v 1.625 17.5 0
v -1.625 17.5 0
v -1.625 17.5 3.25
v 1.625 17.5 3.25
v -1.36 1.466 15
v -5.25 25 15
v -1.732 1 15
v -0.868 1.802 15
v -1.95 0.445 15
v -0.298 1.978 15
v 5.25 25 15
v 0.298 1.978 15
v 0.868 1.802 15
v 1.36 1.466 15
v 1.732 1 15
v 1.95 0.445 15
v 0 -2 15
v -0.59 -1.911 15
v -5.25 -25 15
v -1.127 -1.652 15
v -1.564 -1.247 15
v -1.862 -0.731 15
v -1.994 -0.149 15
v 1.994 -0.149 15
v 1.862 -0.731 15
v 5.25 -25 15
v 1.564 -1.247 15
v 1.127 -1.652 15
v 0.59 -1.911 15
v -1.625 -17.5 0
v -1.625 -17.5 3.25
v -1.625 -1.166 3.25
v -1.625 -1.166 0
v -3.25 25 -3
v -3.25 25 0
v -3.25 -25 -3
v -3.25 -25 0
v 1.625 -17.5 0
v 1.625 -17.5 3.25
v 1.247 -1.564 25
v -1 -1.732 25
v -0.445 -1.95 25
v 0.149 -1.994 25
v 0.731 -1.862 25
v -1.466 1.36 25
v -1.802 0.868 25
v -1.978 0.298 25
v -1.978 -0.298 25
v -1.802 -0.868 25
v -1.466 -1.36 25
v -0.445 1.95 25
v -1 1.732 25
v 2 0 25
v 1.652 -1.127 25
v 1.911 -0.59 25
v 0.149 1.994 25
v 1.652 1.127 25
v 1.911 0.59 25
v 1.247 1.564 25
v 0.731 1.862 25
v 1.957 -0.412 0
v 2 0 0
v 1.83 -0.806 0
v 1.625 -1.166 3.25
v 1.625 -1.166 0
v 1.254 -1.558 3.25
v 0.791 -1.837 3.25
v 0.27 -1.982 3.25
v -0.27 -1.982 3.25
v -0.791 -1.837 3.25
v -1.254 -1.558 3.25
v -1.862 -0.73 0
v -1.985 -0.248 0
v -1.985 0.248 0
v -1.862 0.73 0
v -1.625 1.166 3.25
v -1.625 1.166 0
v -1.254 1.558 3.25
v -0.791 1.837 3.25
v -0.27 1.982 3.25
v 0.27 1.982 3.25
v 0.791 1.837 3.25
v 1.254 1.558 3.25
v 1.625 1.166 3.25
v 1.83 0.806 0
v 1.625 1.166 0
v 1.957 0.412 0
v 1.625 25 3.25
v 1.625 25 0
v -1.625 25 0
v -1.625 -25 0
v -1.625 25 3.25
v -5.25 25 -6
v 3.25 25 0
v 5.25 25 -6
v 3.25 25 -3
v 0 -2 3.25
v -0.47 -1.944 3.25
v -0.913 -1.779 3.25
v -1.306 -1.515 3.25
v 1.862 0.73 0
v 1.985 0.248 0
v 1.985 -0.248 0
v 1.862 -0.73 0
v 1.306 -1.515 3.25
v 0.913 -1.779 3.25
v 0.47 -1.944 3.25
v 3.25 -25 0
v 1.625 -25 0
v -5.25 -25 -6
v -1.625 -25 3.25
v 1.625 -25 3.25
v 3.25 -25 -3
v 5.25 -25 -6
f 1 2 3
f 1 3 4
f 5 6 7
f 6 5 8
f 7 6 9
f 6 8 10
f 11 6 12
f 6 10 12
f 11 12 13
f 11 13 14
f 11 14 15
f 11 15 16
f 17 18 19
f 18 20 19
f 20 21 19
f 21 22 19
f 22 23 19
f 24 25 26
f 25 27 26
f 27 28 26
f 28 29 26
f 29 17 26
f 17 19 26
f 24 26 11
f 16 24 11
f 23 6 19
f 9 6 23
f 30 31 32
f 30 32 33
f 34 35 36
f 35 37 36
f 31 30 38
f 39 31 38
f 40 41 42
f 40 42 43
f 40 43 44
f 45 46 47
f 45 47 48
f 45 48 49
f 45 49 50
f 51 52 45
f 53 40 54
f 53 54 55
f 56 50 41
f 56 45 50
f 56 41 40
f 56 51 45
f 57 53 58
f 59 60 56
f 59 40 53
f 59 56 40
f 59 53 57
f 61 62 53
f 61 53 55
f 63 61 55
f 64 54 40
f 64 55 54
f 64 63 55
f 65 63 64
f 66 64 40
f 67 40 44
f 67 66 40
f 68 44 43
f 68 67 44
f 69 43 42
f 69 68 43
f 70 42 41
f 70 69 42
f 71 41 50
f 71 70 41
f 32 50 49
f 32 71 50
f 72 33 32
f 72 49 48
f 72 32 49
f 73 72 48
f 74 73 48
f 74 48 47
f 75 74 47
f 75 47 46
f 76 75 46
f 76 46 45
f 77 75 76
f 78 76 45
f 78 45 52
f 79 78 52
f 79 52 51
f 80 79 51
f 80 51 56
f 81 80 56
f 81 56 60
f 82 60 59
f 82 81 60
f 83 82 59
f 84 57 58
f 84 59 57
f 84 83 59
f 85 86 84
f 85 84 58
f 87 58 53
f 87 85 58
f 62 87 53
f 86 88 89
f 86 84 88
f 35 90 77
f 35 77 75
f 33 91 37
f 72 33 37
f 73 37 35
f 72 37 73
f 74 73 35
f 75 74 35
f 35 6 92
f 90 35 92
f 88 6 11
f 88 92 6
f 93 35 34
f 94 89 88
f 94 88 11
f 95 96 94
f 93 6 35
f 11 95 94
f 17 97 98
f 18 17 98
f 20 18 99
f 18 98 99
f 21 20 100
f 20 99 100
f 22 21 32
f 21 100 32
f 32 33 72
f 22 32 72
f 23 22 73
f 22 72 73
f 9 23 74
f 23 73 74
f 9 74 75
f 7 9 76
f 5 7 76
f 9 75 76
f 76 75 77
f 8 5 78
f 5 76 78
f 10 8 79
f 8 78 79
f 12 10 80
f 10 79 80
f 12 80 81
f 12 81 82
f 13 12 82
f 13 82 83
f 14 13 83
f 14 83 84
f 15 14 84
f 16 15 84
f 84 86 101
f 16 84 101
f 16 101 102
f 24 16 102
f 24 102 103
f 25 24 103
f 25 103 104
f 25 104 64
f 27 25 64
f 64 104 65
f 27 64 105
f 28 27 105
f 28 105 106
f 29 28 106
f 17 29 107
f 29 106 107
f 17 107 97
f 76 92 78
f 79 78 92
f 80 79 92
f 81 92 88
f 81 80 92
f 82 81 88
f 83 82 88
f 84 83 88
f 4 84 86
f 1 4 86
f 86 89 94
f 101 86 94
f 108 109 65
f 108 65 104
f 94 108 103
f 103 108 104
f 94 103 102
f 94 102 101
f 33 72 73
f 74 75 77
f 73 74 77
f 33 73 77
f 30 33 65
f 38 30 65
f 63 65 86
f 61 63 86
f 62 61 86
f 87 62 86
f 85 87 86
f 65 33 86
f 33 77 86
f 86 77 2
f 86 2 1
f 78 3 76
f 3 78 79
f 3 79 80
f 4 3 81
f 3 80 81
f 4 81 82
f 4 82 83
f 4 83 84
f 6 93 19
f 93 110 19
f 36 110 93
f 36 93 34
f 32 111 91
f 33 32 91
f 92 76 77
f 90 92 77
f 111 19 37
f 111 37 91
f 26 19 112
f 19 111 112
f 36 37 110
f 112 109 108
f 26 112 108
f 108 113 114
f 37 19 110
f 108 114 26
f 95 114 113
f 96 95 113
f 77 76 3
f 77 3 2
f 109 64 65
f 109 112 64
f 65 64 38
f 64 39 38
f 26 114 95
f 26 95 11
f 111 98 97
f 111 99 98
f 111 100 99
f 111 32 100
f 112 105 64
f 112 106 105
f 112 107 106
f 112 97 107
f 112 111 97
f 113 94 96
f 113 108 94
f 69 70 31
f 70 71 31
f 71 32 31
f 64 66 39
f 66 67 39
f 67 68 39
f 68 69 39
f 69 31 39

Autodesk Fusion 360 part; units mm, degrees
sketch "Sketch1" plane through (0, 0, 0) normal (0, 1, 0) x (1, 0, 0) in component "Servo Actuator"
  line L0 (0, 0) -> (3.25, 0)
  line L1 (3.25, 0) -> (3.25, 3)
  line L2 (3.25, 0) -> (5.25, 0)
  line L3 (5.25, 0) -> (5.25, 6)
  line L4 (5.25, 6) -> (3.25, 3)
  line L5 (0, 0) -> (0, -3.25)
  line L6 (0, -3.25) -> (1.625, -3.25)
  line L7 (1.625, -3.25) -> (1.625, 0)
  line L8 (5.25, 0) -> (5.25, -3.25)
  line L9 (5.25, -3.25) -> (1.625, -3.25)
  line L10 (0, -3.25) -> (0, -5.75)
  line L11 (5.25, -3.25) -> (5.25, -5.75)
  line L12 (5.25, -5.75) -> (0, -5.75)
  line L13 (0, -5.75) -> (0, -35)
  line L14 (0, -35) -> (5.25, -35)
  line L15 (5.25, -35) -> (5.25, -5.75)
  line L16 (-5.25, 0) -> (-5.25, -3.25)
  line L17 (0, 0) -> (-3.25, 0)
  line L18 (-5.25, -5.75) -> (0, -5.75)
  line L19 (-5.25, -35) -> (-5.25, -5.75)
  line L20 (-5.25, -3.25) -> (-5.25, -5.75)
  line L21 (-1.625, -3.25) -> (-1.625, 0)
  line L22 (-5.25, 6) -> (-3.25, 3)
  line L23 (-5.25, 0) -> (-5.25, 6)
  line L24 (-3.25, 0) -> (-5.25, 0)
  line L25 (0, -35) -> (-5.25, -35)
  line L26 (0, -3.25) -> (-1.625, -3.25)
  line L27 (-3.25, 0) -> (-3.25, 3)
  line L28 (-5.25, -3.25) -> (-1.625, -3.25)
  dimension "d1" = 3.25
  dimension "d2" = 3
  dimension "d6" = 2
  dimension "d7" = 6
  dimension "d8" = 3.25
  dimension "d9" = 1.625
  dimension "d10" = 3.25
  dimension "d12" = 2.5
  dimension "d13" = 2.5
  dimension "d14" = 29.25
  dimension "d15" = 5.25
extrude "Extrude1" add sketch "Sketch1" along normal mid plane 50 contours L0 L2 L7 L8 L9 | L6 L9 L10 L11 L12 | L10 L18 L20 L26 L28 | L16 L17 L21 L24 L28 | L1 L2 L3 L4 | L12 L13 L14 L15 | L13 L18 L19 L25 | L22 L23 L24 L27 makes body 1 in component "Servo Actuator"
extrude "Extrude2" cut 1 faces at (-1.75, -8.3333, 35) along direction (0, 0, -1) blind 20 on bodies 1 bodies 1 in component "Servo Actuator"
hole "Hole1" at (0, 0, 15) direction (0, 0, -1) diameter 4 depth 25 tip angle 118 bodies 1 in component "Servo Actuator"
extrude "Extrude3" add sketch "Sketch1" along normal mid plane 35 separate body contours L0 L5 L6 L7 | L5 L17 L21 L26 makes body 2 in component "Servo Actuator"
sketch "Sketch2" plane through (0, 0, 0) normal (0, 0, 1) x (1, 0, 0) in component "Servo Actuator"
  circle A0 centre (0, 0) radius 2
  dimension "d27" = 4
extrude "Extrude4" add sketch "Sketch2" along normal blind 25 bodies 2 in component "Servo Actuator"
component "Servo Actuator" placed x (1, 0, 0) y (0, 1, 0) z (0, 0, 1) at (0, 0, 0)
equation "d9 = ( 3.25 / 2 ) * 1 mm"
equation "d25 = ( 35 / 2 ) * 1 mm"
